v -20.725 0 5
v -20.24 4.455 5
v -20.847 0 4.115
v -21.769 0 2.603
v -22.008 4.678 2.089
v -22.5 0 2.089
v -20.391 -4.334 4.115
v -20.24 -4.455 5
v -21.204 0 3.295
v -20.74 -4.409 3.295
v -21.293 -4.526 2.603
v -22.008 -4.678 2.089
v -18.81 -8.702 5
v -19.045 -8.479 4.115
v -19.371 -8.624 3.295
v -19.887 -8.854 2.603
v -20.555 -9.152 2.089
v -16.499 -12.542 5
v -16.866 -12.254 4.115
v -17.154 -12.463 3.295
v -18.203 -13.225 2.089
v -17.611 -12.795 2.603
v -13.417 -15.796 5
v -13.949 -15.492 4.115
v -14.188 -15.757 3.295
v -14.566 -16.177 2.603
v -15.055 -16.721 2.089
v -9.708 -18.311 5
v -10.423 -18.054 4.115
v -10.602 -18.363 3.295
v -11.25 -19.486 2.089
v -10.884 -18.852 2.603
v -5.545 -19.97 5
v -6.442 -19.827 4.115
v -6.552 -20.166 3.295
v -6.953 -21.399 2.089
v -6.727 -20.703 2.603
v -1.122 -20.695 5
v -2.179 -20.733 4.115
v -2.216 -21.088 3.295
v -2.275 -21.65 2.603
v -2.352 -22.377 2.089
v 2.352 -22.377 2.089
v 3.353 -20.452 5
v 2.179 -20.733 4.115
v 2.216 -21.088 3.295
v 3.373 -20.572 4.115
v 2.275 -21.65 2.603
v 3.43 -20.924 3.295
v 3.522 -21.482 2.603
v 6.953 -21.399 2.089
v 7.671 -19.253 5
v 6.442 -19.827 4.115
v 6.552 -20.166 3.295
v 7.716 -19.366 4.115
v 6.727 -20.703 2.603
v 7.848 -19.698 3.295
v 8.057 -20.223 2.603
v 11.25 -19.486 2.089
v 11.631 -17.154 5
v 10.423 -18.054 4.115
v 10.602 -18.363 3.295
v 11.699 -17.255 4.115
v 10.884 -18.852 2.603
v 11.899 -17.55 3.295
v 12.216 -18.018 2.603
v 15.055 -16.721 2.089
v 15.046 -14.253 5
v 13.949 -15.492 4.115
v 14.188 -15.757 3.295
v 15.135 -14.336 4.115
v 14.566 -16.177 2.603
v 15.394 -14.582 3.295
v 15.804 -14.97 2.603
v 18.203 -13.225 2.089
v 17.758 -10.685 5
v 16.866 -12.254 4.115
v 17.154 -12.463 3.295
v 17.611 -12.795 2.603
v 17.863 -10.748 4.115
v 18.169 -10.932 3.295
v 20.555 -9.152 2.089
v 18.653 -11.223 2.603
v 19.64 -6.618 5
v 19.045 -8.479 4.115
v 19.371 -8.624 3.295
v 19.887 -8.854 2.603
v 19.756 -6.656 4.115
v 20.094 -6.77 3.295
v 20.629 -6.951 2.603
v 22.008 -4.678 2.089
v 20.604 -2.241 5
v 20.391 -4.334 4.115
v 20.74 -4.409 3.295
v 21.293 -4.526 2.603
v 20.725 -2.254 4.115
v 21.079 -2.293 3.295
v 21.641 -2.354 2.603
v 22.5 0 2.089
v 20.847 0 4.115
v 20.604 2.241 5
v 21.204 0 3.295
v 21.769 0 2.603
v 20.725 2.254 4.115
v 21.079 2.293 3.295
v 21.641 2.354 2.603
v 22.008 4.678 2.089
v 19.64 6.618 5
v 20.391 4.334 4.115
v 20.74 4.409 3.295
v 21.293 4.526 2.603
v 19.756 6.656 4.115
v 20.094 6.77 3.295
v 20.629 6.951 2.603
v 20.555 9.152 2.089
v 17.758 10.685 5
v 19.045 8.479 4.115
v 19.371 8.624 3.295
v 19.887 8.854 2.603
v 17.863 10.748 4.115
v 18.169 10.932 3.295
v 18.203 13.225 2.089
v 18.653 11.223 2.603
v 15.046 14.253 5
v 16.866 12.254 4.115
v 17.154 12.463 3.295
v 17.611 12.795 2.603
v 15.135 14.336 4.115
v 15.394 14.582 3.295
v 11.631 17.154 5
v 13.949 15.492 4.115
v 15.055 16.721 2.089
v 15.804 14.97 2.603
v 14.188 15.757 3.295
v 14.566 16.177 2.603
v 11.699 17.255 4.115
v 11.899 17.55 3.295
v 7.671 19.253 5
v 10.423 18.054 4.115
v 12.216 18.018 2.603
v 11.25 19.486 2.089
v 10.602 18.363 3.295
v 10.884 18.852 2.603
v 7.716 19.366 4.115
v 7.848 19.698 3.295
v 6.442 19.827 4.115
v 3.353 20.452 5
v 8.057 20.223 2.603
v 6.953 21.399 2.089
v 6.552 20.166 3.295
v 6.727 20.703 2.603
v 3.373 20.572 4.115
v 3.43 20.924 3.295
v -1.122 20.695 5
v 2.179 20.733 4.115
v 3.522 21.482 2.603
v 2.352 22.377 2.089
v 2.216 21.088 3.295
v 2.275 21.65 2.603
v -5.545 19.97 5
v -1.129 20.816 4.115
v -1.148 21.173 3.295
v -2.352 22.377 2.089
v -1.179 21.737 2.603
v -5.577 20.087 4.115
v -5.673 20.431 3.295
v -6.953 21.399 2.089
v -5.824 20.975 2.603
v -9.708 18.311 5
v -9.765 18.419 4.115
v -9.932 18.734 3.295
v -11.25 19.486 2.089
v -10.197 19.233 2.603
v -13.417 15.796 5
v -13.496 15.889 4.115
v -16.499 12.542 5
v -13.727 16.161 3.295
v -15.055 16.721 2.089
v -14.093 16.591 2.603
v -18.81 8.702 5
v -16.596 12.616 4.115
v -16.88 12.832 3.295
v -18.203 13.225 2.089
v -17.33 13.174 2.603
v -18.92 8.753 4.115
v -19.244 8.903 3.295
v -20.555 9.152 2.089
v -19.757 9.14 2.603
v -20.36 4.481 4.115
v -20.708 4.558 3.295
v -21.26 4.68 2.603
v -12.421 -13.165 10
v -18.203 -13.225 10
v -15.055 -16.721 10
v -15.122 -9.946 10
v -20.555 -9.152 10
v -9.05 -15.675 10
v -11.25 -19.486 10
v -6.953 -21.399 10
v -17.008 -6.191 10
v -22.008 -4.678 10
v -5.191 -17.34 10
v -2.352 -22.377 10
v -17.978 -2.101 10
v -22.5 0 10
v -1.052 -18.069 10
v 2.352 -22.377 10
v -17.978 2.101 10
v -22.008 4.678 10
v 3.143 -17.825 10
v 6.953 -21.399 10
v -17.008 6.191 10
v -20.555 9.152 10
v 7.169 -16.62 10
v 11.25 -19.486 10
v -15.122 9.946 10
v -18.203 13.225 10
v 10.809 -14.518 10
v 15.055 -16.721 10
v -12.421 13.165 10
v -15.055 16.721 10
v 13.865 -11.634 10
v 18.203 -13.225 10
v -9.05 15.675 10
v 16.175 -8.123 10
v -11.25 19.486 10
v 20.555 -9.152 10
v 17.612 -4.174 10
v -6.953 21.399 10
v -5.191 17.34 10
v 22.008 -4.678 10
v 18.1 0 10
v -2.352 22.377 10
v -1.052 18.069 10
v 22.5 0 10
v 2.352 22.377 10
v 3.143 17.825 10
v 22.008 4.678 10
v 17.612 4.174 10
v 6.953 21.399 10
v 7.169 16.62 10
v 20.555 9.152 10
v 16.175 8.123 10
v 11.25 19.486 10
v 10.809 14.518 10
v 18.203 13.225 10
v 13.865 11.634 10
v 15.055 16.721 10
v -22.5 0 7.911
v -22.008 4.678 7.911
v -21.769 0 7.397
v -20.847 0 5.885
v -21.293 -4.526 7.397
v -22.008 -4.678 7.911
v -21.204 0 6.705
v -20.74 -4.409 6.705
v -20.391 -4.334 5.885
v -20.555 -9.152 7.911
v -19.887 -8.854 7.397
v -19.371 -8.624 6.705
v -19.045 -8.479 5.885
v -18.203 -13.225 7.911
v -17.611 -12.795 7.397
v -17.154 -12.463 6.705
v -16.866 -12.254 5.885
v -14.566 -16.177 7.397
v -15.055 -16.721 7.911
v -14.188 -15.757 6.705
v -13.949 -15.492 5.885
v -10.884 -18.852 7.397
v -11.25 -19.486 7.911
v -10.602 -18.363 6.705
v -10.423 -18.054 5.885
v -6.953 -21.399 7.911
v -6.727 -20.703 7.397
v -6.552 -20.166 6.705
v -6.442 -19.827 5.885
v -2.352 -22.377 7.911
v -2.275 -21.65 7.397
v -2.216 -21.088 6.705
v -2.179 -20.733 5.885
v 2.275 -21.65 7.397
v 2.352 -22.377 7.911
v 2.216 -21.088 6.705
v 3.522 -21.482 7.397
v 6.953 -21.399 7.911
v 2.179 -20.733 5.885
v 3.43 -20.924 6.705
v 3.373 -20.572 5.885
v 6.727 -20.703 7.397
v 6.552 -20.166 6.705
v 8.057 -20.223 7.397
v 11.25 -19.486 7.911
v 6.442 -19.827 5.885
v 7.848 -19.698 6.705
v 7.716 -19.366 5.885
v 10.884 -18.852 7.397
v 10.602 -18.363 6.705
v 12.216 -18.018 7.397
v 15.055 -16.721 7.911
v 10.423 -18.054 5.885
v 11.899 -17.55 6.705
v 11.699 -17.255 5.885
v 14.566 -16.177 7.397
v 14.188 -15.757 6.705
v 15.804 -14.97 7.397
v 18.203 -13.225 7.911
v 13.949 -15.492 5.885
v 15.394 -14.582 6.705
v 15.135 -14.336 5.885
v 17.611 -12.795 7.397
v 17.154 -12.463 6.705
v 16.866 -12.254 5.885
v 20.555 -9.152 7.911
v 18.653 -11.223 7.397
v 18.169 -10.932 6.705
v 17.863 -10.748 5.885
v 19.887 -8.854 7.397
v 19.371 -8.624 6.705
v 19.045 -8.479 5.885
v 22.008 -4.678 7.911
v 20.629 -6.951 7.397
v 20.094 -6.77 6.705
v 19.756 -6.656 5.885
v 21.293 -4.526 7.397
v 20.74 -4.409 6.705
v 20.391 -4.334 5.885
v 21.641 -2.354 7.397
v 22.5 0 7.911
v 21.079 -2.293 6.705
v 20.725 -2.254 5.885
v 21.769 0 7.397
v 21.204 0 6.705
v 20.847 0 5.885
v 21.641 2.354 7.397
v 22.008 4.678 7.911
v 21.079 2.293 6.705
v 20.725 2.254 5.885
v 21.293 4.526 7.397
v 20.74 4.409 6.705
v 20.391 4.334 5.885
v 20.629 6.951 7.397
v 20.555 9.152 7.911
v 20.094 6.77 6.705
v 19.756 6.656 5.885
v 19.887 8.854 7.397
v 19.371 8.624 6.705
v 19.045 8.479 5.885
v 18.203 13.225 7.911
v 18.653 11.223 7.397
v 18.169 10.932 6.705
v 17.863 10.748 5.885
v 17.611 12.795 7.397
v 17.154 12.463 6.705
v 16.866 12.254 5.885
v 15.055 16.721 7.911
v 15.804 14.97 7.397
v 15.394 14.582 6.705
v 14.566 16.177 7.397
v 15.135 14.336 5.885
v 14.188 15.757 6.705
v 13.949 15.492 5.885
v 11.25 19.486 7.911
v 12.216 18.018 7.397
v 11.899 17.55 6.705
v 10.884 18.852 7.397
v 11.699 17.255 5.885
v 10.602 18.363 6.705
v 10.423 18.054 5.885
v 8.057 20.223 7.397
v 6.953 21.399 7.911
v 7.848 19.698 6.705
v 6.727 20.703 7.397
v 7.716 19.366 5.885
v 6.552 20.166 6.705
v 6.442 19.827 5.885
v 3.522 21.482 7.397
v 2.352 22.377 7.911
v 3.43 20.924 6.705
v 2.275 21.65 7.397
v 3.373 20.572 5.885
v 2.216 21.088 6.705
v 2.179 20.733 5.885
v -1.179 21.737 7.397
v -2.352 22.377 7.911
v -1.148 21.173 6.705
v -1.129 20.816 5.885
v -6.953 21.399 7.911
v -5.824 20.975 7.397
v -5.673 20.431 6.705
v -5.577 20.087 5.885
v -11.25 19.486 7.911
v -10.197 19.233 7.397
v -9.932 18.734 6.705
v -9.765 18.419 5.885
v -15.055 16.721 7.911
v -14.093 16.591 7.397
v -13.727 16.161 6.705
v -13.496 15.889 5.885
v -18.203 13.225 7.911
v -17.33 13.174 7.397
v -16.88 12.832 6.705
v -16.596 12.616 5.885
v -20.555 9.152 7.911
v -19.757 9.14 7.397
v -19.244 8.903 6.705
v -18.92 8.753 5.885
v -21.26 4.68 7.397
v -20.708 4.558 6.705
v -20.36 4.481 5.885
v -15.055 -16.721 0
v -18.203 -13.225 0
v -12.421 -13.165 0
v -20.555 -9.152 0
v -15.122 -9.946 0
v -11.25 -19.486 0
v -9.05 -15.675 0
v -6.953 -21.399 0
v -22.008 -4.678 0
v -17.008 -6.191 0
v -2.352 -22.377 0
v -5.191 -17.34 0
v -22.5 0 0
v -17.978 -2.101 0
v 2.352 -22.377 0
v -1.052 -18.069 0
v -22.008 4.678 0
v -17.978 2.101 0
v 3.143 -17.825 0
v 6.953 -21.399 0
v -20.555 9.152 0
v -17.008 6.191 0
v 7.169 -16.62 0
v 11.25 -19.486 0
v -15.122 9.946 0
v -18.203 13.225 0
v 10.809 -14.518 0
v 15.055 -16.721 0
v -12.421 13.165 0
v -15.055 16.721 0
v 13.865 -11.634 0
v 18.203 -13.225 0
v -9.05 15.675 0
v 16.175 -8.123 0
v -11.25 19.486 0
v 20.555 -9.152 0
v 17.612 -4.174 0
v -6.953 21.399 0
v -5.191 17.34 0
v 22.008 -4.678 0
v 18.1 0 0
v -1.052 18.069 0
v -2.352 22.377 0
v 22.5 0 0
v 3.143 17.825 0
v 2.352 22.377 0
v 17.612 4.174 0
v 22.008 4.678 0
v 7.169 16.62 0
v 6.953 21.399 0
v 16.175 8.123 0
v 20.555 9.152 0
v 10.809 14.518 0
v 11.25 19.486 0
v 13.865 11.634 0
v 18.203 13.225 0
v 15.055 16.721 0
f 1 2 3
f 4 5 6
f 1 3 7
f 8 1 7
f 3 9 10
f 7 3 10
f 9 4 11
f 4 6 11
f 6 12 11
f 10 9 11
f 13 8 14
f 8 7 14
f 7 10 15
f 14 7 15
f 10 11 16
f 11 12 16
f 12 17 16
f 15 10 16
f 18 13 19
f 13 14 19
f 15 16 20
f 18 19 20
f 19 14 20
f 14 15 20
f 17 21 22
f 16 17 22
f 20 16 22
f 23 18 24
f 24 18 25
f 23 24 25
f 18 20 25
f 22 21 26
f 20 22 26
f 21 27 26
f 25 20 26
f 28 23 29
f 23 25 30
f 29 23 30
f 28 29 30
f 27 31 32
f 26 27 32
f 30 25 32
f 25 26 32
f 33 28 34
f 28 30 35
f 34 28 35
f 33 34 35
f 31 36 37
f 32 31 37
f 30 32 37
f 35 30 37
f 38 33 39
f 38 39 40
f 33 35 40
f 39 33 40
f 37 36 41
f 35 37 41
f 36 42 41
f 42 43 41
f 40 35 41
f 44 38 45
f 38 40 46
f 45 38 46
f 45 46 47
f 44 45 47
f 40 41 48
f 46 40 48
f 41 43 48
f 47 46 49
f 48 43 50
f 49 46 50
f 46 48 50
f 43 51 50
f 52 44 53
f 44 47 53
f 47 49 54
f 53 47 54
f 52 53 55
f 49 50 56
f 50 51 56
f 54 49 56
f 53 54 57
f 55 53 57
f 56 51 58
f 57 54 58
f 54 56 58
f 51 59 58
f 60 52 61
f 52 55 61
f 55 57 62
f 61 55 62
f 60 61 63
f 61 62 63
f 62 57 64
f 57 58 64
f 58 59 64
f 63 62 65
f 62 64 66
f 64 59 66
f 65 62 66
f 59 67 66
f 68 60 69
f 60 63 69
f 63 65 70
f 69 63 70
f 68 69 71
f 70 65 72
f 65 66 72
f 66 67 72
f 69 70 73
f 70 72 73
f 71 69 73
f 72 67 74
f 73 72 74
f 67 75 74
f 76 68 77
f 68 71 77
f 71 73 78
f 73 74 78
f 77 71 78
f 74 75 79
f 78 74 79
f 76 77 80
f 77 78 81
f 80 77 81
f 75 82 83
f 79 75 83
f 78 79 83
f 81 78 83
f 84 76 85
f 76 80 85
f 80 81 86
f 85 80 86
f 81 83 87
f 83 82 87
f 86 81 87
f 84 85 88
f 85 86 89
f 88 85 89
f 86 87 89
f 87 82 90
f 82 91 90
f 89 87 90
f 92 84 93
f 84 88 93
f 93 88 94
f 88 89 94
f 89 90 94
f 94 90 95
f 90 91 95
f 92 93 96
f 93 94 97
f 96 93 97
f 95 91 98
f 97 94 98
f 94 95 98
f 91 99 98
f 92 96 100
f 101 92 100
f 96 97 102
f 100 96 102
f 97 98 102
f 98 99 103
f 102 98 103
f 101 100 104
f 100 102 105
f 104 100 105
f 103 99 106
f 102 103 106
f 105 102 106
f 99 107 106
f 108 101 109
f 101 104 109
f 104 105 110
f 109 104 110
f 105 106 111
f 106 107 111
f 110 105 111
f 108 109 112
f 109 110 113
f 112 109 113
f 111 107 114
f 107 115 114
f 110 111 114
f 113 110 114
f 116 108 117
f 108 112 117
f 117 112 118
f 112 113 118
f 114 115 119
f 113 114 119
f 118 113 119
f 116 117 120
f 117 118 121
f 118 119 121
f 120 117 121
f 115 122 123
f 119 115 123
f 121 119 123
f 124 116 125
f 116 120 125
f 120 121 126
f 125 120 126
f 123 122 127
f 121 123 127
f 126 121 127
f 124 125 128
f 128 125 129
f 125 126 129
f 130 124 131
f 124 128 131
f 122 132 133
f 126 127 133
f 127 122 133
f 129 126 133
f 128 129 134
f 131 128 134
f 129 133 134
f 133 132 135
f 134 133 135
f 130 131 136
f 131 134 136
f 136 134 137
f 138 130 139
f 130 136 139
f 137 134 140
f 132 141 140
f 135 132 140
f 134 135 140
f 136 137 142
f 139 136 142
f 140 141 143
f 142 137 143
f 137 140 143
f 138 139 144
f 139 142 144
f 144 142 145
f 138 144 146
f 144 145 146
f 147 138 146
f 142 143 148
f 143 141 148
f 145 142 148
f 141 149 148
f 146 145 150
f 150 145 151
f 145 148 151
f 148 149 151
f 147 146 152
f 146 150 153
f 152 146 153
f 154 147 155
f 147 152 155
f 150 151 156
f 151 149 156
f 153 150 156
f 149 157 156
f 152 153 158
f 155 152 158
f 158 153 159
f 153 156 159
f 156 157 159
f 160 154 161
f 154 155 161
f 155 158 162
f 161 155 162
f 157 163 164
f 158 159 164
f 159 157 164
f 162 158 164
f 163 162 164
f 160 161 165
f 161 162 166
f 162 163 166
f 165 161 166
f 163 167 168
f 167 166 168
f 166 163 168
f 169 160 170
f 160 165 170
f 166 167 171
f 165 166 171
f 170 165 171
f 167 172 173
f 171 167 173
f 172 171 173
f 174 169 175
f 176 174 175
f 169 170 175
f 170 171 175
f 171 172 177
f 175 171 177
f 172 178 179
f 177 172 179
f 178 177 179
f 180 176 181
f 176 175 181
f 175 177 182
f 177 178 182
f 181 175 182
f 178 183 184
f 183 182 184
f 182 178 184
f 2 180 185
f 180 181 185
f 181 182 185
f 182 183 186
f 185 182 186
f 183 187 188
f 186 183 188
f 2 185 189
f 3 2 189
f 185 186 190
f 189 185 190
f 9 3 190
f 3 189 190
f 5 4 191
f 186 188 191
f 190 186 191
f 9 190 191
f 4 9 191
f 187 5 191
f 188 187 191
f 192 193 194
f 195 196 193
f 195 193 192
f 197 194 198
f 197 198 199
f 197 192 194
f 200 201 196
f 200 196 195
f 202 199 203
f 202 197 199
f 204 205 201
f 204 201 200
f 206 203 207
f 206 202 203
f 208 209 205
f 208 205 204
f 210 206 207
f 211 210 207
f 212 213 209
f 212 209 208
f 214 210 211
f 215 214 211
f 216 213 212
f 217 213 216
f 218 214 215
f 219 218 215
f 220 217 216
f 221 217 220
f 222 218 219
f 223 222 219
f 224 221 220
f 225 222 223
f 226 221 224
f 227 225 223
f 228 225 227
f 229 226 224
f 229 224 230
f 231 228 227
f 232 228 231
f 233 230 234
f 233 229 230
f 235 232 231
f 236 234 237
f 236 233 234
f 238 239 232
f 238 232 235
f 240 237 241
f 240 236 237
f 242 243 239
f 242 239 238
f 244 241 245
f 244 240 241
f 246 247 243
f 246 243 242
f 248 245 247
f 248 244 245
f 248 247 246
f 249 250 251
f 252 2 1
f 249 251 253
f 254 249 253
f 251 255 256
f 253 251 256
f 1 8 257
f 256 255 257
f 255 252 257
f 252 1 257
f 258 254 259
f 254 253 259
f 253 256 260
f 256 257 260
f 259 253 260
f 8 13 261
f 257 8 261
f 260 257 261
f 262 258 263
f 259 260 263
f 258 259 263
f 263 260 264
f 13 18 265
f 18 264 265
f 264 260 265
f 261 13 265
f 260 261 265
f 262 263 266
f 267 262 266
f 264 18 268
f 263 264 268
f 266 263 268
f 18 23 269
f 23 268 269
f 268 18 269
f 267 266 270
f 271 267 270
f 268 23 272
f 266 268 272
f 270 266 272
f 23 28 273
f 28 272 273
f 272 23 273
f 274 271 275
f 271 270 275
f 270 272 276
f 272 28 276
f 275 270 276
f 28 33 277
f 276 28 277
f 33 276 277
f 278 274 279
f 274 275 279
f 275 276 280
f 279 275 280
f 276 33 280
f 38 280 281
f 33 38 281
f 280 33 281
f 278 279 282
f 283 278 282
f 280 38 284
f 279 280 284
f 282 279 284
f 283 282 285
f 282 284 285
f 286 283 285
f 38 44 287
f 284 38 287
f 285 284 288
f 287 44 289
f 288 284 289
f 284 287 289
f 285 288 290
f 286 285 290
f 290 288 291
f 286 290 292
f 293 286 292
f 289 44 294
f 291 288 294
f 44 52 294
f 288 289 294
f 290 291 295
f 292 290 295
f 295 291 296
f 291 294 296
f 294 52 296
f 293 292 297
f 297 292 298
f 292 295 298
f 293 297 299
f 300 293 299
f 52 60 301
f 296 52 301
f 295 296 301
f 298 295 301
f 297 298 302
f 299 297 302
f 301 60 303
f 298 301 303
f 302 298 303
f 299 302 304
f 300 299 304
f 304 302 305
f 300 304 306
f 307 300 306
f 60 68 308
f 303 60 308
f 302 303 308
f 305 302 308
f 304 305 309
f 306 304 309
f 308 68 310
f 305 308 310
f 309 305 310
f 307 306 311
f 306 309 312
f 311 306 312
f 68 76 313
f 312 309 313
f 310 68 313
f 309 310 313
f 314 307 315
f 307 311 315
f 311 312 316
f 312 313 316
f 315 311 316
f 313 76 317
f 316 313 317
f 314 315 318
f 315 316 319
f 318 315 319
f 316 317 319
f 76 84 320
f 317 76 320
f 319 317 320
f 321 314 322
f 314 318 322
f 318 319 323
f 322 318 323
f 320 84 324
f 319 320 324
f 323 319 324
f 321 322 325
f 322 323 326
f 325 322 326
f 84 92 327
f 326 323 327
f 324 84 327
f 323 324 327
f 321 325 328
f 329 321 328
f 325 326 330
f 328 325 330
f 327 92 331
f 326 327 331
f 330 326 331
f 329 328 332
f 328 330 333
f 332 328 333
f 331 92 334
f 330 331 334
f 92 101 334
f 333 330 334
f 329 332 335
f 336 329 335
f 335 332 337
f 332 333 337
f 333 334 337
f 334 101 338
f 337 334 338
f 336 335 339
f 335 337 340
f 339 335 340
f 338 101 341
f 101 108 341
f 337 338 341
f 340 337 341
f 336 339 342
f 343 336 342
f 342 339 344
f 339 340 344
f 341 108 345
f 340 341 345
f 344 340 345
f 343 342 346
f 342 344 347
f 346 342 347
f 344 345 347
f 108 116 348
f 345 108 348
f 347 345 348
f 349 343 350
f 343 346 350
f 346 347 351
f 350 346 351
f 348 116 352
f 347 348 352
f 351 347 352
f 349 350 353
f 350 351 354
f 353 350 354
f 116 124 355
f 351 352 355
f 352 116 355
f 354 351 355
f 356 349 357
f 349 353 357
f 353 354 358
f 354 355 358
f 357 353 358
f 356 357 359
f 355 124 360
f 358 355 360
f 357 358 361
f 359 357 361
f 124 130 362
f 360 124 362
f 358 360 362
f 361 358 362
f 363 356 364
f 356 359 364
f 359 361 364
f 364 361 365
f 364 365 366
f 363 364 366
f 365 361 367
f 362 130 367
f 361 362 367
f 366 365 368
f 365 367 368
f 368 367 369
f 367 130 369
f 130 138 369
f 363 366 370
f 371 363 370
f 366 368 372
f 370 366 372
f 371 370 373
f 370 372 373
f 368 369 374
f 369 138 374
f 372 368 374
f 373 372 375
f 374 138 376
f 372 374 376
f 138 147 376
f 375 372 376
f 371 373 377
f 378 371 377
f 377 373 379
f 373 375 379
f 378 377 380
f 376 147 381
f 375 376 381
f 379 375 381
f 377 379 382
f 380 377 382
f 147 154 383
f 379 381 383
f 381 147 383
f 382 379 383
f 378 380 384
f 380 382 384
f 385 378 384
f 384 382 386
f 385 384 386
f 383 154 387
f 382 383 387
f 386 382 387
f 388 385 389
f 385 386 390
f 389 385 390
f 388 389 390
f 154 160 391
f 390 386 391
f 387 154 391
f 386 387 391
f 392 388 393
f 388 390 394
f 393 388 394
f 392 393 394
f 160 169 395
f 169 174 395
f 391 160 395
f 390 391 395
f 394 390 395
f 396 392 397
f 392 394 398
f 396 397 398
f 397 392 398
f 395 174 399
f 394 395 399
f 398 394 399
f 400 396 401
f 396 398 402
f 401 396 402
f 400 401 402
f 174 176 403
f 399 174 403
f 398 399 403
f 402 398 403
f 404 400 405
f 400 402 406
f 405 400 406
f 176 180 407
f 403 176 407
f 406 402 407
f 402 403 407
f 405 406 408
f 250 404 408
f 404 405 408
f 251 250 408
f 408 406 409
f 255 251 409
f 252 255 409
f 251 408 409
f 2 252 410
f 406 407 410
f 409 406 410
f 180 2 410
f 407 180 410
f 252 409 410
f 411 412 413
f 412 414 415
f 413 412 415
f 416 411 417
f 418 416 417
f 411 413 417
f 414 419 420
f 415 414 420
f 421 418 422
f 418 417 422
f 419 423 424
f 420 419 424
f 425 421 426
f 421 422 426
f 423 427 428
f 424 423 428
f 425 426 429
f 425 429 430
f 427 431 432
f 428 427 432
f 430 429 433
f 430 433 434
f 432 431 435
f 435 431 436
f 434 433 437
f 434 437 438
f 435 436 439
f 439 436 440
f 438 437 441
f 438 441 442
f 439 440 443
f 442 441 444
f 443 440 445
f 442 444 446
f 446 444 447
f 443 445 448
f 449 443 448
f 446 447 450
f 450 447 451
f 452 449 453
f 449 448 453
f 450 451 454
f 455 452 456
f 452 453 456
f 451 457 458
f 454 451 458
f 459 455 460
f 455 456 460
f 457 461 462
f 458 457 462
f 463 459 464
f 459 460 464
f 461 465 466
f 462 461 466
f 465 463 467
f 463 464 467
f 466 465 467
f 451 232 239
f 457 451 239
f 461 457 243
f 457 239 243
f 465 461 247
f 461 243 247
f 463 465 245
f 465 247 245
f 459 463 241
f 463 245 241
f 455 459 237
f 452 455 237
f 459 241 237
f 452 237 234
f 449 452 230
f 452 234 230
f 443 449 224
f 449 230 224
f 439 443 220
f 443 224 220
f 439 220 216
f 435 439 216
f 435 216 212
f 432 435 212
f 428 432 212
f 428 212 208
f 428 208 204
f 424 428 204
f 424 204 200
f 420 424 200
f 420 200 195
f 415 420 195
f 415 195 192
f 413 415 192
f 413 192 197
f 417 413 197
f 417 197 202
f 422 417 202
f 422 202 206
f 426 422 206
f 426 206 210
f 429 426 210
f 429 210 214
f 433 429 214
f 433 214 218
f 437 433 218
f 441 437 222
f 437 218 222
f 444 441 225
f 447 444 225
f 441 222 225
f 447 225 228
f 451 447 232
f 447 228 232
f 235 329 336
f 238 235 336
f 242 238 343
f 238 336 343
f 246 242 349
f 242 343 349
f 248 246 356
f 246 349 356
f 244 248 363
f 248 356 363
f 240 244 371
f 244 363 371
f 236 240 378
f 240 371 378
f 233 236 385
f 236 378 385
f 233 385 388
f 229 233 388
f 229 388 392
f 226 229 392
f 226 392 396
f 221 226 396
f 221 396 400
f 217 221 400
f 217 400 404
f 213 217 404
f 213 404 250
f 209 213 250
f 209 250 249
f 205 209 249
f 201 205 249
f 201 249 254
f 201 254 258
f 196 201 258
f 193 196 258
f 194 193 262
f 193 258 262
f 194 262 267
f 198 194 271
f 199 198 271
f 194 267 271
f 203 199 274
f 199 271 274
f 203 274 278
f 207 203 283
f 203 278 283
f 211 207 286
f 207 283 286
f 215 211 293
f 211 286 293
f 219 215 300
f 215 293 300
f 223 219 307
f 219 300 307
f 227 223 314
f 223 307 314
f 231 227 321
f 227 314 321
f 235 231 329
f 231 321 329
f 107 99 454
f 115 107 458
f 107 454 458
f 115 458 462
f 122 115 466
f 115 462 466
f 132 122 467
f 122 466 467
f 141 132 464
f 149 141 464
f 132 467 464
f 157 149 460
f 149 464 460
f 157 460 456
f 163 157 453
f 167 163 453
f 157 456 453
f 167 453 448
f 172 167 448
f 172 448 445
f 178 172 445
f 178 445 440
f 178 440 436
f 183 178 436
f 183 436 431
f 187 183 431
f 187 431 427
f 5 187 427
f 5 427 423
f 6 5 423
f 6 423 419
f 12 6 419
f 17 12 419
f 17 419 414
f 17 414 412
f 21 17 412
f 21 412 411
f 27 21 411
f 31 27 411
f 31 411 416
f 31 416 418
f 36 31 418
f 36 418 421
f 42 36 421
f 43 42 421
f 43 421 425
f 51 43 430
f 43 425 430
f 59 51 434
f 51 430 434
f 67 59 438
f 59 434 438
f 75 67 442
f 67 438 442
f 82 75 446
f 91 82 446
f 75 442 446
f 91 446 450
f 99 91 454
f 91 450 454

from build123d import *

# Parameters (mm, degrees)
SKETCH1_R           = 22.5
BOSS_EXTRUDE1_DEPTH = 10
CUT_EXTRUDE1_REACH  = 12
SKETCH2_R           = 18.1
SKETCH3_R           = 3.275


with BuildPart() as part:
    # Sketch1 → Boss-Extrude1 (new body)
    with BuildSketch(Plane.XY):
        Circle(SKETCH1_R)
    extrude(amount=BOSS_EXTRUDE1_DEPTH)

    # Sketch2 → Cut-Extrude1 (cut, up to next)
    with BuildSketch(Plane.XY.offset(10), mode=Mode.PRIVATE) as cut_extrude1_sk1:
        Circle(SKETCH2_R)
    cut_extrude1_tool1 = extrude(cut_extrude1_sk1.sketch, amount=-CUT_EXTRUDE1_REACH, mode=Mode.PRIVATE) & part.part
    add(cut_extrude1_tool1.solids().sort_by_distance((0, 0, 10))[0], mode=Mode.SUBTRACT)

    # Sketch3 → Cut-Revolve1 (revolve, cut)
    with BuildSketch(Plane(origin=(0, 0, 0), x_dir=(1, 0, 0), z_dir=(0, 1, 0))):
        with Locations((-24, -5)):
            Circle(SKETCH3_R)
    revolve(axis=Axis((0, 0, -18.462767292), (0, 0, 1)), mode=Mode.SUBTRACT)


solid = part.part
